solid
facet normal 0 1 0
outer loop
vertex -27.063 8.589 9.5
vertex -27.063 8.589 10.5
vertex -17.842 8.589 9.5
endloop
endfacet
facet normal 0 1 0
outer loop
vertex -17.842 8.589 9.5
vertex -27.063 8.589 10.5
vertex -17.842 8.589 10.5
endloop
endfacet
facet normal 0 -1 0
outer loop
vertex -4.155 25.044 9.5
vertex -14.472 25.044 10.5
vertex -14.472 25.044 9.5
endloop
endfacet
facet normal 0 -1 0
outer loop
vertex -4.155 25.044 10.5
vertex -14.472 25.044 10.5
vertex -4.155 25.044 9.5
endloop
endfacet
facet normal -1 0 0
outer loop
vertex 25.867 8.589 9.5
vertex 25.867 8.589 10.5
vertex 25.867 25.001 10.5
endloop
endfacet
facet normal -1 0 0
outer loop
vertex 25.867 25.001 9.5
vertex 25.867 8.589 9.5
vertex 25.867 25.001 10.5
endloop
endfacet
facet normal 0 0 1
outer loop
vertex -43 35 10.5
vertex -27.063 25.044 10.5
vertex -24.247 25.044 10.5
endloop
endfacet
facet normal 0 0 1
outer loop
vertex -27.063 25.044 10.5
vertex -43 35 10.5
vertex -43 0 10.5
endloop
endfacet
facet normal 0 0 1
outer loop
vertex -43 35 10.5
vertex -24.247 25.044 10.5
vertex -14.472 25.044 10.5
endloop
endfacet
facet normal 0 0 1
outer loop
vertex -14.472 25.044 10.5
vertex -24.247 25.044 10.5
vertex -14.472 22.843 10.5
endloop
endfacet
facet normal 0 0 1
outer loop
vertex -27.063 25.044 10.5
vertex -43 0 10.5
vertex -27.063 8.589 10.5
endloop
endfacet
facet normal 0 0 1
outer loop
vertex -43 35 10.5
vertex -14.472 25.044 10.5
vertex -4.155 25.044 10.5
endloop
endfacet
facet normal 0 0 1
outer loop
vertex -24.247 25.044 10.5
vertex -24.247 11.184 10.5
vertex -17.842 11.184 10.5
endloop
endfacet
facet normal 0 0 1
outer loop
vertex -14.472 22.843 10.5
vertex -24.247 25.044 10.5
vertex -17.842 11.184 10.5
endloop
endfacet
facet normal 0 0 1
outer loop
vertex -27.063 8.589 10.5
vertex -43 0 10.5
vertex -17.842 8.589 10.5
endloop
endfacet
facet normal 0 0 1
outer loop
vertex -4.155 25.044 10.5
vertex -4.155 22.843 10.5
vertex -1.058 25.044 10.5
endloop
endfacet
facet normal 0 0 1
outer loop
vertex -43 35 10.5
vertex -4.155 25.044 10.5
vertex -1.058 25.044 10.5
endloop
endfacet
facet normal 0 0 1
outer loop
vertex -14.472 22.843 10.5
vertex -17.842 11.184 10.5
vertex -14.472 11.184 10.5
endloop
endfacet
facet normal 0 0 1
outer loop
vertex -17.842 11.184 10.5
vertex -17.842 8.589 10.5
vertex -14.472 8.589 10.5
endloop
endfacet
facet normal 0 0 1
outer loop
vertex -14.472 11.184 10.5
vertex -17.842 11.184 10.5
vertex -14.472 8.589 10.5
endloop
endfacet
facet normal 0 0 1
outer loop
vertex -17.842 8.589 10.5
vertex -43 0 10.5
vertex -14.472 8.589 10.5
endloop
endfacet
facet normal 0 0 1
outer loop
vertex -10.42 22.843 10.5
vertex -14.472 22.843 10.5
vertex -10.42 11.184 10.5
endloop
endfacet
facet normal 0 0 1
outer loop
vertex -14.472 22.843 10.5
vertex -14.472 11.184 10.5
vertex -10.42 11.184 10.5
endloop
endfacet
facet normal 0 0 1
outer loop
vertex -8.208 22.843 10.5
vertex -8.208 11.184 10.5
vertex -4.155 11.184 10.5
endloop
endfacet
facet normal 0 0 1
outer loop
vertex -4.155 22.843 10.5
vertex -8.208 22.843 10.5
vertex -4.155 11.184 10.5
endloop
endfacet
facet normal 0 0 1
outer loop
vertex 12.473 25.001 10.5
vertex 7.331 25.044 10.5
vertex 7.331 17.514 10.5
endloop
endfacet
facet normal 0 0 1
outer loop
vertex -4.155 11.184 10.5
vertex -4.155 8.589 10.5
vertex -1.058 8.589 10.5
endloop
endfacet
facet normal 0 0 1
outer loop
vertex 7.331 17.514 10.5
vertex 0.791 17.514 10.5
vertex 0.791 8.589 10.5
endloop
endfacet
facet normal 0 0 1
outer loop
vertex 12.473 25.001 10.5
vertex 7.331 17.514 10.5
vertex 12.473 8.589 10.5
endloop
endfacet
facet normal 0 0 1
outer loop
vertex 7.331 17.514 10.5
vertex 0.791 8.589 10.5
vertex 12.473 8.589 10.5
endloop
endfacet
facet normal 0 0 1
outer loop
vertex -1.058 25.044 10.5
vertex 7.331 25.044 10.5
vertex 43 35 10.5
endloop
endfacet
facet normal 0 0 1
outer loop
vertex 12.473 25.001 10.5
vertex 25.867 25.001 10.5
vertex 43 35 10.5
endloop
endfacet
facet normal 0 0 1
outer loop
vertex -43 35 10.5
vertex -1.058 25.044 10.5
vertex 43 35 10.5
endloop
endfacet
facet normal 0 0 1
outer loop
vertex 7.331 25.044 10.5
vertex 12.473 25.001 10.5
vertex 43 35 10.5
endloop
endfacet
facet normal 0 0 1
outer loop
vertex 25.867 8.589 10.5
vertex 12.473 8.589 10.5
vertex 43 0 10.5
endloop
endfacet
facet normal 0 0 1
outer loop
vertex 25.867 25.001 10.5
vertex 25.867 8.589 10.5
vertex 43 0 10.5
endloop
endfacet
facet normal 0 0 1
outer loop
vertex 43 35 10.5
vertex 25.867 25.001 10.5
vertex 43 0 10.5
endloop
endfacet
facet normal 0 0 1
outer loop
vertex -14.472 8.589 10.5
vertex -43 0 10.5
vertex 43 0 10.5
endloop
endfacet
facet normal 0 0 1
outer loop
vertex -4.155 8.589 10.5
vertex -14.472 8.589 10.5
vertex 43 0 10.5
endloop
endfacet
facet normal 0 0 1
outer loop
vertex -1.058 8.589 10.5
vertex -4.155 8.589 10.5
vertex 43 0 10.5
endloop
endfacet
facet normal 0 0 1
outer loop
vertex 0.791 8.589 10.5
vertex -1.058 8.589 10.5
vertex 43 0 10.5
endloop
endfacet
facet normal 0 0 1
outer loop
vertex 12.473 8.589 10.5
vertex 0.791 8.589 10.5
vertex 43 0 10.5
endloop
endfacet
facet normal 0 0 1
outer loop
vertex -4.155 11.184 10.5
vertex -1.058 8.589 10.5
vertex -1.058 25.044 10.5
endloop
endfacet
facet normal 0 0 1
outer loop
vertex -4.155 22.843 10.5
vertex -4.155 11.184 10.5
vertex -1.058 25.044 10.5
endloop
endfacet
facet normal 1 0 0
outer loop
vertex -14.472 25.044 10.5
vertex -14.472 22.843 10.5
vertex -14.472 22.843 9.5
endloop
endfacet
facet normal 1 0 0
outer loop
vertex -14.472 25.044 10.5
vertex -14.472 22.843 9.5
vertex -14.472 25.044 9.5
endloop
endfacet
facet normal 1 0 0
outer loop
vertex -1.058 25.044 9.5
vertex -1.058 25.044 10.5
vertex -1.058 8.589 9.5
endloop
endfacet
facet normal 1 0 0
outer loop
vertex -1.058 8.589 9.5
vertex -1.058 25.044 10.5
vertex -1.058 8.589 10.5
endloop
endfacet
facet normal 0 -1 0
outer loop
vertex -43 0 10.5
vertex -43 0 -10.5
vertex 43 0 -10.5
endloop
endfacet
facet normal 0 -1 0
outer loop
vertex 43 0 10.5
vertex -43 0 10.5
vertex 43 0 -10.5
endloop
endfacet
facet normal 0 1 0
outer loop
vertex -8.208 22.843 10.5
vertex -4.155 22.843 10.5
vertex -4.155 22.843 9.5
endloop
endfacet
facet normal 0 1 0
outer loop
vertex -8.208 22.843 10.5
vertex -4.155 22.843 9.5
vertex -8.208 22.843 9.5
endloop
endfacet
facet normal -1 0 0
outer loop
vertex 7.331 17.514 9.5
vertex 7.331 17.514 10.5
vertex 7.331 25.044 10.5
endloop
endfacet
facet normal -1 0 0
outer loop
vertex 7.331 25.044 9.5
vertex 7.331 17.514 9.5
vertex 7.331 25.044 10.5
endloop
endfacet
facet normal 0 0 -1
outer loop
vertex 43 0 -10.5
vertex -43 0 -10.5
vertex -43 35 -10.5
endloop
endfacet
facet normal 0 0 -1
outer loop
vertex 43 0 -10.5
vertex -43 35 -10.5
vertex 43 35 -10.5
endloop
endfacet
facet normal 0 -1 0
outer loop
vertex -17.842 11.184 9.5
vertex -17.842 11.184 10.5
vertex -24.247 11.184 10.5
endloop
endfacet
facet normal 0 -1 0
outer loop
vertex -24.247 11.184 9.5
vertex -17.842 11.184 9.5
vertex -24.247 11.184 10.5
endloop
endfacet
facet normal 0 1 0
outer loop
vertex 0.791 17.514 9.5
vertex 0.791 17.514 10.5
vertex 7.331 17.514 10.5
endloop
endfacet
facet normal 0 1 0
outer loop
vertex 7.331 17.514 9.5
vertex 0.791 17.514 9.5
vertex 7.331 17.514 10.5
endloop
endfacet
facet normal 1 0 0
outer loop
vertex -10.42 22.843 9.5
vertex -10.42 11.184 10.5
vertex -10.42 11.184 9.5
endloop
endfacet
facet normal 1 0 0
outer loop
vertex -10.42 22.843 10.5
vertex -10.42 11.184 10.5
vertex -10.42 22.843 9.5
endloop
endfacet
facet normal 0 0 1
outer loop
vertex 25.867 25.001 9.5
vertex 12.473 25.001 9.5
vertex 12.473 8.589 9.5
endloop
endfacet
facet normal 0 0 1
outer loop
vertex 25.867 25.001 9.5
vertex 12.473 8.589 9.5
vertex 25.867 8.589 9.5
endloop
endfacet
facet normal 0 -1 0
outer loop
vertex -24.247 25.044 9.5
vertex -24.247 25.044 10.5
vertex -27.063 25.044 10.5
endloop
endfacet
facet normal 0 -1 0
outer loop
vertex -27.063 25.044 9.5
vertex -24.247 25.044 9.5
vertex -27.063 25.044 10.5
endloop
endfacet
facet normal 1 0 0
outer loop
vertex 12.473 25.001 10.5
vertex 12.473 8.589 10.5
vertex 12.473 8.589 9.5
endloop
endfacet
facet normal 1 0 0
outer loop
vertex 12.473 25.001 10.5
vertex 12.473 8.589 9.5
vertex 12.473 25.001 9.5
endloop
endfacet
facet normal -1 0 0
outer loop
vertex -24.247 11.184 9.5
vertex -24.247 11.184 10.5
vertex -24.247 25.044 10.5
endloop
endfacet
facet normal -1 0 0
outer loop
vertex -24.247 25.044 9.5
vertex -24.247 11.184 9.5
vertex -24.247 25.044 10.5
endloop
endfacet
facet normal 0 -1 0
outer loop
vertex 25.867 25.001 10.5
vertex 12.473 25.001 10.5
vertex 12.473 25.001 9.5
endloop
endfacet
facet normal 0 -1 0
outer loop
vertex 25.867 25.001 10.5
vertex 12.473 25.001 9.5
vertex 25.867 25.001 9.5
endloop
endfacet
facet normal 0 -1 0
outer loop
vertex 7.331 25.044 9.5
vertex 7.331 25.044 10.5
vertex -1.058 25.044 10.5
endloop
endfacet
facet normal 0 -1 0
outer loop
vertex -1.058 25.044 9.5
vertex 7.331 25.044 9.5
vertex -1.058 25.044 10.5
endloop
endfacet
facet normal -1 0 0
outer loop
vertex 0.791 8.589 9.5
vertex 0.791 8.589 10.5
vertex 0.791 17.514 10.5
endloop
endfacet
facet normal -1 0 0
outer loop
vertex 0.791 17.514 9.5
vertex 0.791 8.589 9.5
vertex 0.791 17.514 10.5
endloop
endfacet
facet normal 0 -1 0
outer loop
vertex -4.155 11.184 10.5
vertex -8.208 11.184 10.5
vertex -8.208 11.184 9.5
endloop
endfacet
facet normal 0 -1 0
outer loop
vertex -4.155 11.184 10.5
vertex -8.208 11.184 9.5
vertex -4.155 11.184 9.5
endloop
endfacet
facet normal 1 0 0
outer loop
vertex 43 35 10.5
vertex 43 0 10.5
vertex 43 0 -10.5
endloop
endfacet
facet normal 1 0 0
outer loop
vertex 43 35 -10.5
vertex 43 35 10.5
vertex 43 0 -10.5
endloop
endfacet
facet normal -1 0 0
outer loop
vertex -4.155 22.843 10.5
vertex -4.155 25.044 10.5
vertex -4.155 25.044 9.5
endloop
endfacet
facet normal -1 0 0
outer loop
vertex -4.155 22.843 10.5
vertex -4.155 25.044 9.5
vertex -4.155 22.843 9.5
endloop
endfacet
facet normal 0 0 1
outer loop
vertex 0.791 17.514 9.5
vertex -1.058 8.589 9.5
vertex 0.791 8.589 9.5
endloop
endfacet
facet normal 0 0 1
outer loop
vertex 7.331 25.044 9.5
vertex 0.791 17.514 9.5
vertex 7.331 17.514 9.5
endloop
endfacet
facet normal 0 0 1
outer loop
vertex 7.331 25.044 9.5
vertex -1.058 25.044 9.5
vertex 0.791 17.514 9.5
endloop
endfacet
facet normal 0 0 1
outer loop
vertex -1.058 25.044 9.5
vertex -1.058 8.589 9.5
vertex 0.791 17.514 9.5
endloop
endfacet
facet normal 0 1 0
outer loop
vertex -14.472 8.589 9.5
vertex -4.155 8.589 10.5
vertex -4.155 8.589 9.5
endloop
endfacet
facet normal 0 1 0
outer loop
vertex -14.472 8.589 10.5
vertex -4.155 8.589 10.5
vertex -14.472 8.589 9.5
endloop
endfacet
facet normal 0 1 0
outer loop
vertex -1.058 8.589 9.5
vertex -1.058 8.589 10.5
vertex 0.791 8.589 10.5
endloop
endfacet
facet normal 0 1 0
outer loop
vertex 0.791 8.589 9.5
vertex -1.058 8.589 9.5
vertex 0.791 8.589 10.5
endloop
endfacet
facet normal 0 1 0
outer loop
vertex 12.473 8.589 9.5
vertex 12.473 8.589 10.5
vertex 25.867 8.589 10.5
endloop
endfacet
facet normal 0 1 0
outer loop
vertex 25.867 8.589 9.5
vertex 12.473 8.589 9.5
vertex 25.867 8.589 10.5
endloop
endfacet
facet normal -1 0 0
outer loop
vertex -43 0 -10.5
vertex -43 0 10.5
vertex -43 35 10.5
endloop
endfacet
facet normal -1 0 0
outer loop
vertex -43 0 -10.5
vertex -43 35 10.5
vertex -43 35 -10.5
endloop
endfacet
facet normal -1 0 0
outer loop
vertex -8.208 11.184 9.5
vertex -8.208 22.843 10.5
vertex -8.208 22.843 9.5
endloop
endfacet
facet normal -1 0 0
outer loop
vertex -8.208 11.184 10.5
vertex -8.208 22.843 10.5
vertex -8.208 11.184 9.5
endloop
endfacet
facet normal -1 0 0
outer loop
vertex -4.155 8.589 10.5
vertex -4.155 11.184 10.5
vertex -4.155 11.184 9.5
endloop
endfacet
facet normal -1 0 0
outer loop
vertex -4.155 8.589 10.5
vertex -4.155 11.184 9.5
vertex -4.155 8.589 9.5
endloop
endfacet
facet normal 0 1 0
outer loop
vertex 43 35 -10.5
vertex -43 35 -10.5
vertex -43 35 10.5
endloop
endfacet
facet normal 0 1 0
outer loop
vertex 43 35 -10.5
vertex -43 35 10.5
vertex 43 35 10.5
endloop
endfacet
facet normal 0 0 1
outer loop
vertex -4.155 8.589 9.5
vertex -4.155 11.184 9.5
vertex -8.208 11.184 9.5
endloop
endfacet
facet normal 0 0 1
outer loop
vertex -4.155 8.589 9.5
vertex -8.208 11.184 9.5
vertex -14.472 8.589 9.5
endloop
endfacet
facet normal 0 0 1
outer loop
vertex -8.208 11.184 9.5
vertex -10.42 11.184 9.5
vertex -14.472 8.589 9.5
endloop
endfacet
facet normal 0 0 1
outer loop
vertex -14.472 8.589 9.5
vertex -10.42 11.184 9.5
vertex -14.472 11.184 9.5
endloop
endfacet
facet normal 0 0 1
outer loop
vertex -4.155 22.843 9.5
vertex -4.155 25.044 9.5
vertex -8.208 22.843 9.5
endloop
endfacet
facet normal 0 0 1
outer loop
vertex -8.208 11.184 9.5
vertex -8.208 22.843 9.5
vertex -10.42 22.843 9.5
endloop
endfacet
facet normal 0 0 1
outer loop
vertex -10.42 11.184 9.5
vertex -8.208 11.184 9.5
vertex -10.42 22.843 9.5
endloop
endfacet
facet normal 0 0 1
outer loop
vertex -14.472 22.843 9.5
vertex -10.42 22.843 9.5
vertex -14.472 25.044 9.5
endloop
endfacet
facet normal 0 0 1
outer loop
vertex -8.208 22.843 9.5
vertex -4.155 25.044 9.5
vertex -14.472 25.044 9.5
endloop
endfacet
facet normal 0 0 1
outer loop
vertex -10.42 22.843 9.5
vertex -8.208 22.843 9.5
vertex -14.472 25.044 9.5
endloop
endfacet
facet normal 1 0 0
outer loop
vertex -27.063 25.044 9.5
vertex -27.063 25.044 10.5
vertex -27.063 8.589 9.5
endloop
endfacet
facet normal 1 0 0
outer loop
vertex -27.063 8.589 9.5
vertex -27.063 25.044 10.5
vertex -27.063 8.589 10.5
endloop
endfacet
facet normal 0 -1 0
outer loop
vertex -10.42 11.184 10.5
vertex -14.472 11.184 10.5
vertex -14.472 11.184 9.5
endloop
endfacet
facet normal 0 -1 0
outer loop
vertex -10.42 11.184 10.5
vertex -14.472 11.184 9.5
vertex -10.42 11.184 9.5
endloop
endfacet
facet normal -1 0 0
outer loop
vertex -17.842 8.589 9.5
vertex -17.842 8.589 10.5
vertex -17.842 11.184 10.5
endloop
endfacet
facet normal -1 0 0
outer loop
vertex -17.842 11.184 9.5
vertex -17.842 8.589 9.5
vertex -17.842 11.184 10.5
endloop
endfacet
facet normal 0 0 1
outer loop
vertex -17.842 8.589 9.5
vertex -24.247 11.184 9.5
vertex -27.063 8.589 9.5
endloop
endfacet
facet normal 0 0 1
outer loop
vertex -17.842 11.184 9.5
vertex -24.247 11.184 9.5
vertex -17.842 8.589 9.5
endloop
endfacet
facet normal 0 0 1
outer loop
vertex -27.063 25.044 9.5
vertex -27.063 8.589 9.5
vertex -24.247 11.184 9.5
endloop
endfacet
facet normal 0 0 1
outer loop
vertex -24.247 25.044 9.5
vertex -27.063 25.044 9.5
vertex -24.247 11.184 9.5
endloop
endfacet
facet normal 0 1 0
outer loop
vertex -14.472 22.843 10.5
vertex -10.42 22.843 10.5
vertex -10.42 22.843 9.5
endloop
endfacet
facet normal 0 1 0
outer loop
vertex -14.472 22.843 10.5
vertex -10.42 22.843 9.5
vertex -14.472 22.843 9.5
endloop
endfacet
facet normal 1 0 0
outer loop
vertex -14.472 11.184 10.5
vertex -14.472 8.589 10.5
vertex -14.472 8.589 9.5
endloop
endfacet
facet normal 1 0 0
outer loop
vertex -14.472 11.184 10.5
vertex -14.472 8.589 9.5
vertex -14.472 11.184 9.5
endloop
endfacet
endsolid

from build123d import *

# Parameters (mm, degrees)
SKETCH1_W           = 86
SKETCH1_H           = 21
BOSS_EXTRUDE1_DEPTH = 35
SKETCH2_W           = 13.394867866
SKETCH2_H           = 16.41192305
CUT_EXTRUDE1_DEPTH  = 1


with BuildPart() as part:
    # Sketch1 → Boss-Extrude1 (new body)
    with BuildSketch(Plane(origin=(0, 0, 0), x_dir=(1, 0, 0), z_dir=(0, 1, 0))):
        Rectangle(SKETCH1_W, SKETCH1_H)
    extrude(amount=BOSS_EXTRUDE1_DEPTH)

    # Sketch2 → Cut-Extrude1 (cut)
    with BuildSketch(Plane.XY.offset(10.5)):
        Polygon((-27.062922658, 25.043511527), (-27.062922658, 8.589083039), (-17.841816761, 8.589083039), (-17.841816761, 11.184244579), (-24.246896306, 11.184244579), (-24.246896306, 25.043511527), align=None)
        Polygon((-14.472064369, 25.043511527), (-4.155267693, 25.043511527), (-4.155267693, 22.842768469), (-8.207777961, 22.842768469), (-8.207777961, 11.184244579), (-4.155267693, 11.184244579), (-4.155267693, 8.589083039), (-14.472064369, 8.589083039), (-14.472064369, 11.184244579), (-10.419554101, 11.184244579), (-10.419554101, 22.842768469), (-14.472064369, 22.842768469), align=None)
        Polygon((-1.057635761, 25.043511527), (-1.057635761, 8.589083039), (0.791487413, 8.589083039), (0.791487413, 17.514312266), (7.331069367, 17.514312266), (7.331069367, 25.043511527), align=None)
        with Locations((19.169967733, 16.795044564)):
            Rectangle(SKETCH2_W, SKETCH2_H)
    extrude(amount=-CUT_EXTRUDE1_DEPTH, mode=Mode.SUBTRACT)


solid = part.part
